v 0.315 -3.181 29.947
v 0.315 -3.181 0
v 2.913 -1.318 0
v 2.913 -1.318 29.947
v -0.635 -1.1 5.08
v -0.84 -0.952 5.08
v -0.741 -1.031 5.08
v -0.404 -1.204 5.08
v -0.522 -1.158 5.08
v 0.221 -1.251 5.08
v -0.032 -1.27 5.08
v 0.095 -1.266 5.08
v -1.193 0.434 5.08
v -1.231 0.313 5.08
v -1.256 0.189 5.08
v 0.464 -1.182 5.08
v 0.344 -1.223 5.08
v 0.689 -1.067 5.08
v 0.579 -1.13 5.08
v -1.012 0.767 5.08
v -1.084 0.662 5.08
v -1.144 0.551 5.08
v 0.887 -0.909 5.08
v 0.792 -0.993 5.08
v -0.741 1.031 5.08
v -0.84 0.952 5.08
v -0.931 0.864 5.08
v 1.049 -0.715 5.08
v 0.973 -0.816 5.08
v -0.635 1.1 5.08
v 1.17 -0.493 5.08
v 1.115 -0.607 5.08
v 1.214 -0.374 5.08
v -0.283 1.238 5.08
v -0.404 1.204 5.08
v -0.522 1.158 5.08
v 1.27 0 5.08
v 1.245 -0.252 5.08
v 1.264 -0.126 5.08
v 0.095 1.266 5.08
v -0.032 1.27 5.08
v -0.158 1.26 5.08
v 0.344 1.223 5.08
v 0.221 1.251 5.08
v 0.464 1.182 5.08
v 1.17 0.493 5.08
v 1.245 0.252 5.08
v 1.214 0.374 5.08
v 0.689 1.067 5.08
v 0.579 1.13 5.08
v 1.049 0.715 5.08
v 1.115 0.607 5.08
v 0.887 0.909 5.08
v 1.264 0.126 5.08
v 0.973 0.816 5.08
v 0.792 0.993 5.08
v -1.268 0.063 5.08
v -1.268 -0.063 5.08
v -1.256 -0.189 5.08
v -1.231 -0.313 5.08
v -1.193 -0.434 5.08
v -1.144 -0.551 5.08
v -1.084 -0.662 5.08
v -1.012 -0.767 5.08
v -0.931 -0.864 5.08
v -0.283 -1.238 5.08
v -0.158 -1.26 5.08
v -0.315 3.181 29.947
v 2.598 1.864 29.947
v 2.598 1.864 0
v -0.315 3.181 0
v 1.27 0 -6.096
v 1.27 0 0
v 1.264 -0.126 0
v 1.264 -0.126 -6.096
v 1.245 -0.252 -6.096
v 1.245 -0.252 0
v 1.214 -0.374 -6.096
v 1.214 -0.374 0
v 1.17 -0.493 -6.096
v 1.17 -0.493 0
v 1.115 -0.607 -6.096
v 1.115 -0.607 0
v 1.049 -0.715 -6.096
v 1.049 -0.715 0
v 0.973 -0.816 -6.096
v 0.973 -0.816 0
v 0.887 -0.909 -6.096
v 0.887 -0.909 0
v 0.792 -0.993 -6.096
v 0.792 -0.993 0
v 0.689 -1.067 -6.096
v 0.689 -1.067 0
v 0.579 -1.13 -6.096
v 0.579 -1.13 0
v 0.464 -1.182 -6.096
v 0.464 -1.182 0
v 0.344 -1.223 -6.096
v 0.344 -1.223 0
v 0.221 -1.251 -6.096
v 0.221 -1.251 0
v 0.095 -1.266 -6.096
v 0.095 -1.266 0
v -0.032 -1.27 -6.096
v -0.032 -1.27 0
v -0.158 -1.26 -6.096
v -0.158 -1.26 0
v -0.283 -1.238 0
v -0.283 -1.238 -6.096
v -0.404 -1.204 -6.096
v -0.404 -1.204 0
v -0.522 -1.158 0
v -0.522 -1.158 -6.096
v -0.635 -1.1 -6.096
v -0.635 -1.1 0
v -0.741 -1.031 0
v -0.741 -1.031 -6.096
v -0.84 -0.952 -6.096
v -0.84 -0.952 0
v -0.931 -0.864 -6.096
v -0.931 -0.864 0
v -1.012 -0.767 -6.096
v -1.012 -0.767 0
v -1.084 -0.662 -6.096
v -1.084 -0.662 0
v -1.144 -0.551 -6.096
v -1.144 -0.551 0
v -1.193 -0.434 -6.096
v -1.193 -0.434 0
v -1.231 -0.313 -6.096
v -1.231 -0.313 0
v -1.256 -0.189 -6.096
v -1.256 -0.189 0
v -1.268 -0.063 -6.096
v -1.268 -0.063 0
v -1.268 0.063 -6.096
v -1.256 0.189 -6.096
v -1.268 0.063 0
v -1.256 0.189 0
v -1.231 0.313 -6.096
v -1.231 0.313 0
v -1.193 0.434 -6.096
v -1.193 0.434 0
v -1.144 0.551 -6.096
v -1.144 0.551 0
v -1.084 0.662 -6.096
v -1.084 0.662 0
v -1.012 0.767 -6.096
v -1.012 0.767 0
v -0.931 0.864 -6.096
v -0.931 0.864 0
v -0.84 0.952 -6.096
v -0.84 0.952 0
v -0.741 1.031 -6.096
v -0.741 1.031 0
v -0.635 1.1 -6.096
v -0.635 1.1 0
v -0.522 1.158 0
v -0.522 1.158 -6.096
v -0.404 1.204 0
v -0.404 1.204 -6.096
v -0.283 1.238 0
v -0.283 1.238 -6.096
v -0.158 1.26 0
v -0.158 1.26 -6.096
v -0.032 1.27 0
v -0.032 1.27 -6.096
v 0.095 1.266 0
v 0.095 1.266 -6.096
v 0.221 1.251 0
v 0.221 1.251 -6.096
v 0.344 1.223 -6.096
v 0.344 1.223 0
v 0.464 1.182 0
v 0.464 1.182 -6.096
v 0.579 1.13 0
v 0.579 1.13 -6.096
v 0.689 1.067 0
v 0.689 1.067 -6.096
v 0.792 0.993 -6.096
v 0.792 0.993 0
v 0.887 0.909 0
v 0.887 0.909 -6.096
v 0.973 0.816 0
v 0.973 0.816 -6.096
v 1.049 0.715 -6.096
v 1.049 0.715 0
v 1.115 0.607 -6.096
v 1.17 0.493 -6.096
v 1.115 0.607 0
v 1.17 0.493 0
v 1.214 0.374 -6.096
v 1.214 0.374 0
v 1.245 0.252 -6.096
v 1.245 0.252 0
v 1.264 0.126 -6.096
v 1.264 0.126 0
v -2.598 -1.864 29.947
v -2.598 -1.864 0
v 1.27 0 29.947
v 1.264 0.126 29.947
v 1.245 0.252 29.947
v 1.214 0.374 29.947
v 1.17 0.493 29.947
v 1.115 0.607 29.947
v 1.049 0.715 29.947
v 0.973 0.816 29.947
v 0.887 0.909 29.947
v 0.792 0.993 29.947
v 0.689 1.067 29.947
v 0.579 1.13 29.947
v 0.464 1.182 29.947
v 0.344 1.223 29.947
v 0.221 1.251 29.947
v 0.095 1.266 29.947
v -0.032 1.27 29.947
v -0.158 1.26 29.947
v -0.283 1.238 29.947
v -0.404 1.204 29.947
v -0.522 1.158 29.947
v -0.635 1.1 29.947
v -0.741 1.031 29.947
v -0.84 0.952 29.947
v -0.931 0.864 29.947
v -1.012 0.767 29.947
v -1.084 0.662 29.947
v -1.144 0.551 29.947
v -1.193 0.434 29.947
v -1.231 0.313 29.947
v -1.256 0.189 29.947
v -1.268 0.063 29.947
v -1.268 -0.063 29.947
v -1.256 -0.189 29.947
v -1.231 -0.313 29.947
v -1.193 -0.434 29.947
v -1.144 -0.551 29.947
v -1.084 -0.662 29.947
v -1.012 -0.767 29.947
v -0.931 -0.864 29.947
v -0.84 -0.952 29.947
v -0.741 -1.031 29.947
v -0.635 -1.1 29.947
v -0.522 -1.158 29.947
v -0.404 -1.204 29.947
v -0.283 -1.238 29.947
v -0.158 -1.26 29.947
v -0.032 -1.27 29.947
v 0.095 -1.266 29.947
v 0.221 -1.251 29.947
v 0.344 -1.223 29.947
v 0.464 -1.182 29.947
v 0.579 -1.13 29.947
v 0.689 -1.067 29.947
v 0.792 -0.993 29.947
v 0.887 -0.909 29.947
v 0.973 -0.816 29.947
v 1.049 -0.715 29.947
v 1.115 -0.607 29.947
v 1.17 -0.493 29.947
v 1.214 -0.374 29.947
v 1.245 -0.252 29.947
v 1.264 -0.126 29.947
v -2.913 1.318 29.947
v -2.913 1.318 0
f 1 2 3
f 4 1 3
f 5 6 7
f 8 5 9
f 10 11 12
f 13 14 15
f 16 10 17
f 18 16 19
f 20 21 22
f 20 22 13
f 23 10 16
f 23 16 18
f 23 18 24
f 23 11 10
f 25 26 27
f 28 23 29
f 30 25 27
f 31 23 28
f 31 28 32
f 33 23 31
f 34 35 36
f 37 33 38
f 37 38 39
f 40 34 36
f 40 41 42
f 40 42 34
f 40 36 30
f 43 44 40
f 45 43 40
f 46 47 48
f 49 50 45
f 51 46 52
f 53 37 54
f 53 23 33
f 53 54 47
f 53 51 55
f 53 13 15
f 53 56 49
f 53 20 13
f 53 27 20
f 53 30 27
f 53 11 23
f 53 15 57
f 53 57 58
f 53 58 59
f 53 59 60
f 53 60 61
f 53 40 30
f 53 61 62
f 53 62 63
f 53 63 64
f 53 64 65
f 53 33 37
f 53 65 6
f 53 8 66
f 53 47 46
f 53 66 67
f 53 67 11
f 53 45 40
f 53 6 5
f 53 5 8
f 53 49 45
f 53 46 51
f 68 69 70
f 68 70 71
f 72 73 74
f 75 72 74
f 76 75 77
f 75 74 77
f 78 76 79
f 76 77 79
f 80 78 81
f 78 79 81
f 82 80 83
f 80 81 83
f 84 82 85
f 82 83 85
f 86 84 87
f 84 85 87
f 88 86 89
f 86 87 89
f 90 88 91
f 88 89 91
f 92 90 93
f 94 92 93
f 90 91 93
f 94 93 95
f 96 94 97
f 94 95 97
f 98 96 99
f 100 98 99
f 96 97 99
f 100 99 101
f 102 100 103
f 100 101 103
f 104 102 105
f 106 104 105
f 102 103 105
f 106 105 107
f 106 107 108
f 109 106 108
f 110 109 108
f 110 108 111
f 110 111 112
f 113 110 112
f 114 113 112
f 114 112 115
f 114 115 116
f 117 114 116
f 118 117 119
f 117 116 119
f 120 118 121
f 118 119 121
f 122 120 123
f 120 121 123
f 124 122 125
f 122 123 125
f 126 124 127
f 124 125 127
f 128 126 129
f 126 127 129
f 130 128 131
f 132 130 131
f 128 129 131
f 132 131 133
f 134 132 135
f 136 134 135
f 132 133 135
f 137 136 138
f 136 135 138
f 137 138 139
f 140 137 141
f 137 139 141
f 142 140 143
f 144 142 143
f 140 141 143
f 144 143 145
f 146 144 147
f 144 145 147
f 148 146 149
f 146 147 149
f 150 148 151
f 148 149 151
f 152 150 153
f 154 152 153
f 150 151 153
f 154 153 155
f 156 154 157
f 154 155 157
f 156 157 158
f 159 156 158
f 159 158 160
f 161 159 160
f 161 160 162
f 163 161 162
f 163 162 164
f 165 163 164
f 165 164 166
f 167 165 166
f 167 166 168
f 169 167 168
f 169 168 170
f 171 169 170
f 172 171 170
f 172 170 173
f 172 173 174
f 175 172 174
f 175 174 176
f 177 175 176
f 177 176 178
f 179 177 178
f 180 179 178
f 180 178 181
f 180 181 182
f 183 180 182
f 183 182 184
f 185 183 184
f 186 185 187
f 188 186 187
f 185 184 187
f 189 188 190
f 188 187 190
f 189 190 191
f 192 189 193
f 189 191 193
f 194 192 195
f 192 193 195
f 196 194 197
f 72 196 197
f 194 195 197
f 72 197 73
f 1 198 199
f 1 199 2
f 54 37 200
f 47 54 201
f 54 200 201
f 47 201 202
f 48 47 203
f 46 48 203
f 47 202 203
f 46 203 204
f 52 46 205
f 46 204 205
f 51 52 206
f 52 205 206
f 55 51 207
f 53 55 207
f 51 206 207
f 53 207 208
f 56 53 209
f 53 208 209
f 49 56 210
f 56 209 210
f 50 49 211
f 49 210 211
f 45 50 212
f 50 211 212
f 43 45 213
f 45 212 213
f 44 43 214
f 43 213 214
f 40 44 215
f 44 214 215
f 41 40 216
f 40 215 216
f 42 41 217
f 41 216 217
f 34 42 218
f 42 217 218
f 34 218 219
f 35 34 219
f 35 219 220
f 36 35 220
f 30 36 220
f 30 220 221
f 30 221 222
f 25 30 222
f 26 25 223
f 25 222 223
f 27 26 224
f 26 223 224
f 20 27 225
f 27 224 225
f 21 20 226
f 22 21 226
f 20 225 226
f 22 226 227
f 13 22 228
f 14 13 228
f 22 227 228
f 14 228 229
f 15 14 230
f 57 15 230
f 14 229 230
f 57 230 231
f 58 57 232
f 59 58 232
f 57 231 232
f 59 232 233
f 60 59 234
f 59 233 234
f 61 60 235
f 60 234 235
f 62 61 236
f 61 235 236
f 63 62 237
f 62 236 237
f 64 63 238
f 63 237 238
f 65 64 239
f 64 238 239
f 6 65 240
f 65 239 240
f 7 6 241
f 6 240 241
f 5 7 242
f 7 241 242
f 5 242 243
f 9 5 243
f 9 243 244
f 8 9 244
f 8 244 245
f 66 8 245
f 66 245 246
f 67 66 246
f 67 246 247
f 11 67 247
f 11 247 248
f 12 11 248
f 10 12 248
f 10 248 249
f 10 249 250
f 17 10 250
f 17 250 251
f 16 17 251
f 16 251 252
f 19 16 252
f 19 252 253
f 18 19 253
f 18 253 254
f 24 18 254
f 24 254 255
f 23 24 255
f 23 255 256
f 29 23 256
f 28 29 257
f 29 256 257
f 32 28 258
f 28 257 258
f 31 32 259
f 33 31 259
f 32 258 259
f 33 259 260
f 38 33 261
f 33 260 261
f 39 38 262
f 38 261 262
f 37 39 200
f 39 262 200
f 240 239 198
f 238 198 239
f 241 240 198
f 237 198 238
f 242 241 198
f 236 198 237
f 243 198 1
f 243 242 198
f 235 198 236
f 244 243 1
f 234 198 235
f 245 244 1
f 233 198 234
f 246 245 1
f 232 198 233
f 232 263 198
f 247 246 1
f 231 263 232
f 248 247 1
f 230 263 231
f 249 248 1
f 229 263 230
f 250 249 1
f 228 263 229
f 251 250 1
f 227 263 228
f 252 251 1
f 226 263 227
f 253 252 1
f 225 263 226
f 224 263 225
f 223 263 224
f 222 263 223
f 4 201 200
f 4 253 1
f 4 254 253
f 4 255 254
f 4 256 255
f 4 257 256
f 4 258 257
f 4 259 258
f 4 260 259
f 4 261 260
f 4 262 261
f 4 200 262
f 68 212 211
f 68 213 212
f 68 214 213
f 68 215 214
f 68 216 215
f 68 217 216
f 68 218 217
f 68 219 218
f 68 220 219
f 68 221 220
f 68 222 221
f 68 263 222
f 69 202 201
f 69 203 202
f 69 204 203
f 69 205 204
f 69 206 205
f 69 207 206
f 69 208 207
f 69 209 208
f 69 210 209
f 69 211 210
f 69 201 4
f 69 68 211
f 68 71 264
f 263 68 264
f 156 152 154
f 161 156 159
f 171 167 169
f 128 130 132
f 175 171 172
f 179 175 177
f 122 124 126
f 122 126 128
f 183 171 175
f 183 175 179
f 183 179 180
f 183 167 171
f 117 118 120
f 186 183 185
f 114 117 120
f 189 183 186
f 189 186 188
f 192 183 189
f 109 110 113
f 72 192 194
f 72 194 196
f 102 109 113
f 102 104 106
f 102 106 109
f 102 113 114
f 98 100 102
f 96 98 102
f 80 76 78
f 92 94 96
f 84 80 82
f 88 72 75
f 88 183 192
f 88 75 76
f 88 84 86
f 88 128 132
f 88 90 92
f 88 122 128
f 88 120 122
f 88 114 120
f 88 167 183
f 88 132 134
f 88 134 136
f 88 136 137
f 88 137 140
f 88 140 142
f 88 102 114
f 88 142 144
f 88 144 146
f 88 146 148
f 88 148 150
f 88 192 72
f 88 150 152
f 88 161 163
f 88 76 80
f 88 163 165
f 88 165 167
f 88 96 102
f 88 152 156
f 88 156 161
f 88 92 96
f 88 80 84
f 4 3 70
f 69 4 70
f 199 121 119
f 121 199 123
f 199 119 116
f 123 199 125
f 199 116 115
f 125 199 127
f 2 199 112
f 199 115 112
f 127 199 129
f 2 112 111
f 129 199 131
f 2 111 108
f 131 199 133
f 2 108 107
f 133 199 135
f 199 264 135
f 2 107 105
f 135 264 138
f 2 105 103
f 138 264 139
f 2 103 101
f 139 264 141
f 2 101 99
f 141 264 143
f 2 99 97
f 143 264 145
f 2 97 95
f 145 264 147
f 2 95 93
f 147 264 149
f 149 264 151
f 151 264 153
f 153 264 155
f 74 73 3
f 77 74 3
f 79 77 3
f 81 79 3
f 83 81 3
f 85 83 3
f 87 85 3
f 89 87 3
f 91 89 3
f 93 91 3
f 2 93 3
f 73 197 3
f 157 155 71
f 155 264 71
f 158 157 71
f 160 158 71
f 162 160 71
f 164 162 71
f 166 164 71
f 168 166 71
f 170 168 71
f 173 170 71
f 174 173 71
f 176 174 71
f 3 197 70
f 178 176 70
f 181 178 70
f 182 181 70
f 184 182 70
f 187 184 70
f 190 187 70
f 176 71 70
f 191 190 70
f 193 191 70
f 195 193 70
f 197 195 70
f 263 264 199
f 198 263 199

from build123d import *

# Parameters (mm, degrees)
BOSS_EXTRUDE1_DEPTH = 29.9466
SKETCH2_R           = 1.27
CUT_EXTRUDE1_DEPTH  = 24.8666
SKETCH3_R           = 1.27
BOSS_EXTRUDE2_DEPTH = 6.096


with BuildPart() as part:
    # Sketch1 → Boss-Extrude1 (new body)
    with BuildSketch(Plane.XY):
        Polygon((-2.597606711, -1.863500467), (0.315035389, -3.181343634), (2.912642099, -1.317843167), (2.597606711, 1.863500467), (-0.315035389, 3.181343634), (-2.912642099, 1.317843167), align=None)
    extrude(amount=BOSS_EXTRUDE1_DEPTH)

    # Sketch2 → Cut-Extrude1 (cut)
    with BuildSketch(Plane.XY.offset(29.9466)):
        Circle(SKETCH2_R)
    extrude(amount=-CUT_EXTRUDE1_DEPTH, mode=Mode.SUBTRACT)

    # Sketch3 → Boss-Extrude2 (add)
    with BuildSketch(Plane(origin=(0, 0, 0), x_dir=(-1, 0, 0), z_dir=(0, 0, -1))):
        with Locations(Location((0, 0, 0), (0, 0, 180))):
            Circle(SKETCH3_R)
    extrude(amount=BOSS_EXTRUDE2_DEPTH)


solid = part.part
